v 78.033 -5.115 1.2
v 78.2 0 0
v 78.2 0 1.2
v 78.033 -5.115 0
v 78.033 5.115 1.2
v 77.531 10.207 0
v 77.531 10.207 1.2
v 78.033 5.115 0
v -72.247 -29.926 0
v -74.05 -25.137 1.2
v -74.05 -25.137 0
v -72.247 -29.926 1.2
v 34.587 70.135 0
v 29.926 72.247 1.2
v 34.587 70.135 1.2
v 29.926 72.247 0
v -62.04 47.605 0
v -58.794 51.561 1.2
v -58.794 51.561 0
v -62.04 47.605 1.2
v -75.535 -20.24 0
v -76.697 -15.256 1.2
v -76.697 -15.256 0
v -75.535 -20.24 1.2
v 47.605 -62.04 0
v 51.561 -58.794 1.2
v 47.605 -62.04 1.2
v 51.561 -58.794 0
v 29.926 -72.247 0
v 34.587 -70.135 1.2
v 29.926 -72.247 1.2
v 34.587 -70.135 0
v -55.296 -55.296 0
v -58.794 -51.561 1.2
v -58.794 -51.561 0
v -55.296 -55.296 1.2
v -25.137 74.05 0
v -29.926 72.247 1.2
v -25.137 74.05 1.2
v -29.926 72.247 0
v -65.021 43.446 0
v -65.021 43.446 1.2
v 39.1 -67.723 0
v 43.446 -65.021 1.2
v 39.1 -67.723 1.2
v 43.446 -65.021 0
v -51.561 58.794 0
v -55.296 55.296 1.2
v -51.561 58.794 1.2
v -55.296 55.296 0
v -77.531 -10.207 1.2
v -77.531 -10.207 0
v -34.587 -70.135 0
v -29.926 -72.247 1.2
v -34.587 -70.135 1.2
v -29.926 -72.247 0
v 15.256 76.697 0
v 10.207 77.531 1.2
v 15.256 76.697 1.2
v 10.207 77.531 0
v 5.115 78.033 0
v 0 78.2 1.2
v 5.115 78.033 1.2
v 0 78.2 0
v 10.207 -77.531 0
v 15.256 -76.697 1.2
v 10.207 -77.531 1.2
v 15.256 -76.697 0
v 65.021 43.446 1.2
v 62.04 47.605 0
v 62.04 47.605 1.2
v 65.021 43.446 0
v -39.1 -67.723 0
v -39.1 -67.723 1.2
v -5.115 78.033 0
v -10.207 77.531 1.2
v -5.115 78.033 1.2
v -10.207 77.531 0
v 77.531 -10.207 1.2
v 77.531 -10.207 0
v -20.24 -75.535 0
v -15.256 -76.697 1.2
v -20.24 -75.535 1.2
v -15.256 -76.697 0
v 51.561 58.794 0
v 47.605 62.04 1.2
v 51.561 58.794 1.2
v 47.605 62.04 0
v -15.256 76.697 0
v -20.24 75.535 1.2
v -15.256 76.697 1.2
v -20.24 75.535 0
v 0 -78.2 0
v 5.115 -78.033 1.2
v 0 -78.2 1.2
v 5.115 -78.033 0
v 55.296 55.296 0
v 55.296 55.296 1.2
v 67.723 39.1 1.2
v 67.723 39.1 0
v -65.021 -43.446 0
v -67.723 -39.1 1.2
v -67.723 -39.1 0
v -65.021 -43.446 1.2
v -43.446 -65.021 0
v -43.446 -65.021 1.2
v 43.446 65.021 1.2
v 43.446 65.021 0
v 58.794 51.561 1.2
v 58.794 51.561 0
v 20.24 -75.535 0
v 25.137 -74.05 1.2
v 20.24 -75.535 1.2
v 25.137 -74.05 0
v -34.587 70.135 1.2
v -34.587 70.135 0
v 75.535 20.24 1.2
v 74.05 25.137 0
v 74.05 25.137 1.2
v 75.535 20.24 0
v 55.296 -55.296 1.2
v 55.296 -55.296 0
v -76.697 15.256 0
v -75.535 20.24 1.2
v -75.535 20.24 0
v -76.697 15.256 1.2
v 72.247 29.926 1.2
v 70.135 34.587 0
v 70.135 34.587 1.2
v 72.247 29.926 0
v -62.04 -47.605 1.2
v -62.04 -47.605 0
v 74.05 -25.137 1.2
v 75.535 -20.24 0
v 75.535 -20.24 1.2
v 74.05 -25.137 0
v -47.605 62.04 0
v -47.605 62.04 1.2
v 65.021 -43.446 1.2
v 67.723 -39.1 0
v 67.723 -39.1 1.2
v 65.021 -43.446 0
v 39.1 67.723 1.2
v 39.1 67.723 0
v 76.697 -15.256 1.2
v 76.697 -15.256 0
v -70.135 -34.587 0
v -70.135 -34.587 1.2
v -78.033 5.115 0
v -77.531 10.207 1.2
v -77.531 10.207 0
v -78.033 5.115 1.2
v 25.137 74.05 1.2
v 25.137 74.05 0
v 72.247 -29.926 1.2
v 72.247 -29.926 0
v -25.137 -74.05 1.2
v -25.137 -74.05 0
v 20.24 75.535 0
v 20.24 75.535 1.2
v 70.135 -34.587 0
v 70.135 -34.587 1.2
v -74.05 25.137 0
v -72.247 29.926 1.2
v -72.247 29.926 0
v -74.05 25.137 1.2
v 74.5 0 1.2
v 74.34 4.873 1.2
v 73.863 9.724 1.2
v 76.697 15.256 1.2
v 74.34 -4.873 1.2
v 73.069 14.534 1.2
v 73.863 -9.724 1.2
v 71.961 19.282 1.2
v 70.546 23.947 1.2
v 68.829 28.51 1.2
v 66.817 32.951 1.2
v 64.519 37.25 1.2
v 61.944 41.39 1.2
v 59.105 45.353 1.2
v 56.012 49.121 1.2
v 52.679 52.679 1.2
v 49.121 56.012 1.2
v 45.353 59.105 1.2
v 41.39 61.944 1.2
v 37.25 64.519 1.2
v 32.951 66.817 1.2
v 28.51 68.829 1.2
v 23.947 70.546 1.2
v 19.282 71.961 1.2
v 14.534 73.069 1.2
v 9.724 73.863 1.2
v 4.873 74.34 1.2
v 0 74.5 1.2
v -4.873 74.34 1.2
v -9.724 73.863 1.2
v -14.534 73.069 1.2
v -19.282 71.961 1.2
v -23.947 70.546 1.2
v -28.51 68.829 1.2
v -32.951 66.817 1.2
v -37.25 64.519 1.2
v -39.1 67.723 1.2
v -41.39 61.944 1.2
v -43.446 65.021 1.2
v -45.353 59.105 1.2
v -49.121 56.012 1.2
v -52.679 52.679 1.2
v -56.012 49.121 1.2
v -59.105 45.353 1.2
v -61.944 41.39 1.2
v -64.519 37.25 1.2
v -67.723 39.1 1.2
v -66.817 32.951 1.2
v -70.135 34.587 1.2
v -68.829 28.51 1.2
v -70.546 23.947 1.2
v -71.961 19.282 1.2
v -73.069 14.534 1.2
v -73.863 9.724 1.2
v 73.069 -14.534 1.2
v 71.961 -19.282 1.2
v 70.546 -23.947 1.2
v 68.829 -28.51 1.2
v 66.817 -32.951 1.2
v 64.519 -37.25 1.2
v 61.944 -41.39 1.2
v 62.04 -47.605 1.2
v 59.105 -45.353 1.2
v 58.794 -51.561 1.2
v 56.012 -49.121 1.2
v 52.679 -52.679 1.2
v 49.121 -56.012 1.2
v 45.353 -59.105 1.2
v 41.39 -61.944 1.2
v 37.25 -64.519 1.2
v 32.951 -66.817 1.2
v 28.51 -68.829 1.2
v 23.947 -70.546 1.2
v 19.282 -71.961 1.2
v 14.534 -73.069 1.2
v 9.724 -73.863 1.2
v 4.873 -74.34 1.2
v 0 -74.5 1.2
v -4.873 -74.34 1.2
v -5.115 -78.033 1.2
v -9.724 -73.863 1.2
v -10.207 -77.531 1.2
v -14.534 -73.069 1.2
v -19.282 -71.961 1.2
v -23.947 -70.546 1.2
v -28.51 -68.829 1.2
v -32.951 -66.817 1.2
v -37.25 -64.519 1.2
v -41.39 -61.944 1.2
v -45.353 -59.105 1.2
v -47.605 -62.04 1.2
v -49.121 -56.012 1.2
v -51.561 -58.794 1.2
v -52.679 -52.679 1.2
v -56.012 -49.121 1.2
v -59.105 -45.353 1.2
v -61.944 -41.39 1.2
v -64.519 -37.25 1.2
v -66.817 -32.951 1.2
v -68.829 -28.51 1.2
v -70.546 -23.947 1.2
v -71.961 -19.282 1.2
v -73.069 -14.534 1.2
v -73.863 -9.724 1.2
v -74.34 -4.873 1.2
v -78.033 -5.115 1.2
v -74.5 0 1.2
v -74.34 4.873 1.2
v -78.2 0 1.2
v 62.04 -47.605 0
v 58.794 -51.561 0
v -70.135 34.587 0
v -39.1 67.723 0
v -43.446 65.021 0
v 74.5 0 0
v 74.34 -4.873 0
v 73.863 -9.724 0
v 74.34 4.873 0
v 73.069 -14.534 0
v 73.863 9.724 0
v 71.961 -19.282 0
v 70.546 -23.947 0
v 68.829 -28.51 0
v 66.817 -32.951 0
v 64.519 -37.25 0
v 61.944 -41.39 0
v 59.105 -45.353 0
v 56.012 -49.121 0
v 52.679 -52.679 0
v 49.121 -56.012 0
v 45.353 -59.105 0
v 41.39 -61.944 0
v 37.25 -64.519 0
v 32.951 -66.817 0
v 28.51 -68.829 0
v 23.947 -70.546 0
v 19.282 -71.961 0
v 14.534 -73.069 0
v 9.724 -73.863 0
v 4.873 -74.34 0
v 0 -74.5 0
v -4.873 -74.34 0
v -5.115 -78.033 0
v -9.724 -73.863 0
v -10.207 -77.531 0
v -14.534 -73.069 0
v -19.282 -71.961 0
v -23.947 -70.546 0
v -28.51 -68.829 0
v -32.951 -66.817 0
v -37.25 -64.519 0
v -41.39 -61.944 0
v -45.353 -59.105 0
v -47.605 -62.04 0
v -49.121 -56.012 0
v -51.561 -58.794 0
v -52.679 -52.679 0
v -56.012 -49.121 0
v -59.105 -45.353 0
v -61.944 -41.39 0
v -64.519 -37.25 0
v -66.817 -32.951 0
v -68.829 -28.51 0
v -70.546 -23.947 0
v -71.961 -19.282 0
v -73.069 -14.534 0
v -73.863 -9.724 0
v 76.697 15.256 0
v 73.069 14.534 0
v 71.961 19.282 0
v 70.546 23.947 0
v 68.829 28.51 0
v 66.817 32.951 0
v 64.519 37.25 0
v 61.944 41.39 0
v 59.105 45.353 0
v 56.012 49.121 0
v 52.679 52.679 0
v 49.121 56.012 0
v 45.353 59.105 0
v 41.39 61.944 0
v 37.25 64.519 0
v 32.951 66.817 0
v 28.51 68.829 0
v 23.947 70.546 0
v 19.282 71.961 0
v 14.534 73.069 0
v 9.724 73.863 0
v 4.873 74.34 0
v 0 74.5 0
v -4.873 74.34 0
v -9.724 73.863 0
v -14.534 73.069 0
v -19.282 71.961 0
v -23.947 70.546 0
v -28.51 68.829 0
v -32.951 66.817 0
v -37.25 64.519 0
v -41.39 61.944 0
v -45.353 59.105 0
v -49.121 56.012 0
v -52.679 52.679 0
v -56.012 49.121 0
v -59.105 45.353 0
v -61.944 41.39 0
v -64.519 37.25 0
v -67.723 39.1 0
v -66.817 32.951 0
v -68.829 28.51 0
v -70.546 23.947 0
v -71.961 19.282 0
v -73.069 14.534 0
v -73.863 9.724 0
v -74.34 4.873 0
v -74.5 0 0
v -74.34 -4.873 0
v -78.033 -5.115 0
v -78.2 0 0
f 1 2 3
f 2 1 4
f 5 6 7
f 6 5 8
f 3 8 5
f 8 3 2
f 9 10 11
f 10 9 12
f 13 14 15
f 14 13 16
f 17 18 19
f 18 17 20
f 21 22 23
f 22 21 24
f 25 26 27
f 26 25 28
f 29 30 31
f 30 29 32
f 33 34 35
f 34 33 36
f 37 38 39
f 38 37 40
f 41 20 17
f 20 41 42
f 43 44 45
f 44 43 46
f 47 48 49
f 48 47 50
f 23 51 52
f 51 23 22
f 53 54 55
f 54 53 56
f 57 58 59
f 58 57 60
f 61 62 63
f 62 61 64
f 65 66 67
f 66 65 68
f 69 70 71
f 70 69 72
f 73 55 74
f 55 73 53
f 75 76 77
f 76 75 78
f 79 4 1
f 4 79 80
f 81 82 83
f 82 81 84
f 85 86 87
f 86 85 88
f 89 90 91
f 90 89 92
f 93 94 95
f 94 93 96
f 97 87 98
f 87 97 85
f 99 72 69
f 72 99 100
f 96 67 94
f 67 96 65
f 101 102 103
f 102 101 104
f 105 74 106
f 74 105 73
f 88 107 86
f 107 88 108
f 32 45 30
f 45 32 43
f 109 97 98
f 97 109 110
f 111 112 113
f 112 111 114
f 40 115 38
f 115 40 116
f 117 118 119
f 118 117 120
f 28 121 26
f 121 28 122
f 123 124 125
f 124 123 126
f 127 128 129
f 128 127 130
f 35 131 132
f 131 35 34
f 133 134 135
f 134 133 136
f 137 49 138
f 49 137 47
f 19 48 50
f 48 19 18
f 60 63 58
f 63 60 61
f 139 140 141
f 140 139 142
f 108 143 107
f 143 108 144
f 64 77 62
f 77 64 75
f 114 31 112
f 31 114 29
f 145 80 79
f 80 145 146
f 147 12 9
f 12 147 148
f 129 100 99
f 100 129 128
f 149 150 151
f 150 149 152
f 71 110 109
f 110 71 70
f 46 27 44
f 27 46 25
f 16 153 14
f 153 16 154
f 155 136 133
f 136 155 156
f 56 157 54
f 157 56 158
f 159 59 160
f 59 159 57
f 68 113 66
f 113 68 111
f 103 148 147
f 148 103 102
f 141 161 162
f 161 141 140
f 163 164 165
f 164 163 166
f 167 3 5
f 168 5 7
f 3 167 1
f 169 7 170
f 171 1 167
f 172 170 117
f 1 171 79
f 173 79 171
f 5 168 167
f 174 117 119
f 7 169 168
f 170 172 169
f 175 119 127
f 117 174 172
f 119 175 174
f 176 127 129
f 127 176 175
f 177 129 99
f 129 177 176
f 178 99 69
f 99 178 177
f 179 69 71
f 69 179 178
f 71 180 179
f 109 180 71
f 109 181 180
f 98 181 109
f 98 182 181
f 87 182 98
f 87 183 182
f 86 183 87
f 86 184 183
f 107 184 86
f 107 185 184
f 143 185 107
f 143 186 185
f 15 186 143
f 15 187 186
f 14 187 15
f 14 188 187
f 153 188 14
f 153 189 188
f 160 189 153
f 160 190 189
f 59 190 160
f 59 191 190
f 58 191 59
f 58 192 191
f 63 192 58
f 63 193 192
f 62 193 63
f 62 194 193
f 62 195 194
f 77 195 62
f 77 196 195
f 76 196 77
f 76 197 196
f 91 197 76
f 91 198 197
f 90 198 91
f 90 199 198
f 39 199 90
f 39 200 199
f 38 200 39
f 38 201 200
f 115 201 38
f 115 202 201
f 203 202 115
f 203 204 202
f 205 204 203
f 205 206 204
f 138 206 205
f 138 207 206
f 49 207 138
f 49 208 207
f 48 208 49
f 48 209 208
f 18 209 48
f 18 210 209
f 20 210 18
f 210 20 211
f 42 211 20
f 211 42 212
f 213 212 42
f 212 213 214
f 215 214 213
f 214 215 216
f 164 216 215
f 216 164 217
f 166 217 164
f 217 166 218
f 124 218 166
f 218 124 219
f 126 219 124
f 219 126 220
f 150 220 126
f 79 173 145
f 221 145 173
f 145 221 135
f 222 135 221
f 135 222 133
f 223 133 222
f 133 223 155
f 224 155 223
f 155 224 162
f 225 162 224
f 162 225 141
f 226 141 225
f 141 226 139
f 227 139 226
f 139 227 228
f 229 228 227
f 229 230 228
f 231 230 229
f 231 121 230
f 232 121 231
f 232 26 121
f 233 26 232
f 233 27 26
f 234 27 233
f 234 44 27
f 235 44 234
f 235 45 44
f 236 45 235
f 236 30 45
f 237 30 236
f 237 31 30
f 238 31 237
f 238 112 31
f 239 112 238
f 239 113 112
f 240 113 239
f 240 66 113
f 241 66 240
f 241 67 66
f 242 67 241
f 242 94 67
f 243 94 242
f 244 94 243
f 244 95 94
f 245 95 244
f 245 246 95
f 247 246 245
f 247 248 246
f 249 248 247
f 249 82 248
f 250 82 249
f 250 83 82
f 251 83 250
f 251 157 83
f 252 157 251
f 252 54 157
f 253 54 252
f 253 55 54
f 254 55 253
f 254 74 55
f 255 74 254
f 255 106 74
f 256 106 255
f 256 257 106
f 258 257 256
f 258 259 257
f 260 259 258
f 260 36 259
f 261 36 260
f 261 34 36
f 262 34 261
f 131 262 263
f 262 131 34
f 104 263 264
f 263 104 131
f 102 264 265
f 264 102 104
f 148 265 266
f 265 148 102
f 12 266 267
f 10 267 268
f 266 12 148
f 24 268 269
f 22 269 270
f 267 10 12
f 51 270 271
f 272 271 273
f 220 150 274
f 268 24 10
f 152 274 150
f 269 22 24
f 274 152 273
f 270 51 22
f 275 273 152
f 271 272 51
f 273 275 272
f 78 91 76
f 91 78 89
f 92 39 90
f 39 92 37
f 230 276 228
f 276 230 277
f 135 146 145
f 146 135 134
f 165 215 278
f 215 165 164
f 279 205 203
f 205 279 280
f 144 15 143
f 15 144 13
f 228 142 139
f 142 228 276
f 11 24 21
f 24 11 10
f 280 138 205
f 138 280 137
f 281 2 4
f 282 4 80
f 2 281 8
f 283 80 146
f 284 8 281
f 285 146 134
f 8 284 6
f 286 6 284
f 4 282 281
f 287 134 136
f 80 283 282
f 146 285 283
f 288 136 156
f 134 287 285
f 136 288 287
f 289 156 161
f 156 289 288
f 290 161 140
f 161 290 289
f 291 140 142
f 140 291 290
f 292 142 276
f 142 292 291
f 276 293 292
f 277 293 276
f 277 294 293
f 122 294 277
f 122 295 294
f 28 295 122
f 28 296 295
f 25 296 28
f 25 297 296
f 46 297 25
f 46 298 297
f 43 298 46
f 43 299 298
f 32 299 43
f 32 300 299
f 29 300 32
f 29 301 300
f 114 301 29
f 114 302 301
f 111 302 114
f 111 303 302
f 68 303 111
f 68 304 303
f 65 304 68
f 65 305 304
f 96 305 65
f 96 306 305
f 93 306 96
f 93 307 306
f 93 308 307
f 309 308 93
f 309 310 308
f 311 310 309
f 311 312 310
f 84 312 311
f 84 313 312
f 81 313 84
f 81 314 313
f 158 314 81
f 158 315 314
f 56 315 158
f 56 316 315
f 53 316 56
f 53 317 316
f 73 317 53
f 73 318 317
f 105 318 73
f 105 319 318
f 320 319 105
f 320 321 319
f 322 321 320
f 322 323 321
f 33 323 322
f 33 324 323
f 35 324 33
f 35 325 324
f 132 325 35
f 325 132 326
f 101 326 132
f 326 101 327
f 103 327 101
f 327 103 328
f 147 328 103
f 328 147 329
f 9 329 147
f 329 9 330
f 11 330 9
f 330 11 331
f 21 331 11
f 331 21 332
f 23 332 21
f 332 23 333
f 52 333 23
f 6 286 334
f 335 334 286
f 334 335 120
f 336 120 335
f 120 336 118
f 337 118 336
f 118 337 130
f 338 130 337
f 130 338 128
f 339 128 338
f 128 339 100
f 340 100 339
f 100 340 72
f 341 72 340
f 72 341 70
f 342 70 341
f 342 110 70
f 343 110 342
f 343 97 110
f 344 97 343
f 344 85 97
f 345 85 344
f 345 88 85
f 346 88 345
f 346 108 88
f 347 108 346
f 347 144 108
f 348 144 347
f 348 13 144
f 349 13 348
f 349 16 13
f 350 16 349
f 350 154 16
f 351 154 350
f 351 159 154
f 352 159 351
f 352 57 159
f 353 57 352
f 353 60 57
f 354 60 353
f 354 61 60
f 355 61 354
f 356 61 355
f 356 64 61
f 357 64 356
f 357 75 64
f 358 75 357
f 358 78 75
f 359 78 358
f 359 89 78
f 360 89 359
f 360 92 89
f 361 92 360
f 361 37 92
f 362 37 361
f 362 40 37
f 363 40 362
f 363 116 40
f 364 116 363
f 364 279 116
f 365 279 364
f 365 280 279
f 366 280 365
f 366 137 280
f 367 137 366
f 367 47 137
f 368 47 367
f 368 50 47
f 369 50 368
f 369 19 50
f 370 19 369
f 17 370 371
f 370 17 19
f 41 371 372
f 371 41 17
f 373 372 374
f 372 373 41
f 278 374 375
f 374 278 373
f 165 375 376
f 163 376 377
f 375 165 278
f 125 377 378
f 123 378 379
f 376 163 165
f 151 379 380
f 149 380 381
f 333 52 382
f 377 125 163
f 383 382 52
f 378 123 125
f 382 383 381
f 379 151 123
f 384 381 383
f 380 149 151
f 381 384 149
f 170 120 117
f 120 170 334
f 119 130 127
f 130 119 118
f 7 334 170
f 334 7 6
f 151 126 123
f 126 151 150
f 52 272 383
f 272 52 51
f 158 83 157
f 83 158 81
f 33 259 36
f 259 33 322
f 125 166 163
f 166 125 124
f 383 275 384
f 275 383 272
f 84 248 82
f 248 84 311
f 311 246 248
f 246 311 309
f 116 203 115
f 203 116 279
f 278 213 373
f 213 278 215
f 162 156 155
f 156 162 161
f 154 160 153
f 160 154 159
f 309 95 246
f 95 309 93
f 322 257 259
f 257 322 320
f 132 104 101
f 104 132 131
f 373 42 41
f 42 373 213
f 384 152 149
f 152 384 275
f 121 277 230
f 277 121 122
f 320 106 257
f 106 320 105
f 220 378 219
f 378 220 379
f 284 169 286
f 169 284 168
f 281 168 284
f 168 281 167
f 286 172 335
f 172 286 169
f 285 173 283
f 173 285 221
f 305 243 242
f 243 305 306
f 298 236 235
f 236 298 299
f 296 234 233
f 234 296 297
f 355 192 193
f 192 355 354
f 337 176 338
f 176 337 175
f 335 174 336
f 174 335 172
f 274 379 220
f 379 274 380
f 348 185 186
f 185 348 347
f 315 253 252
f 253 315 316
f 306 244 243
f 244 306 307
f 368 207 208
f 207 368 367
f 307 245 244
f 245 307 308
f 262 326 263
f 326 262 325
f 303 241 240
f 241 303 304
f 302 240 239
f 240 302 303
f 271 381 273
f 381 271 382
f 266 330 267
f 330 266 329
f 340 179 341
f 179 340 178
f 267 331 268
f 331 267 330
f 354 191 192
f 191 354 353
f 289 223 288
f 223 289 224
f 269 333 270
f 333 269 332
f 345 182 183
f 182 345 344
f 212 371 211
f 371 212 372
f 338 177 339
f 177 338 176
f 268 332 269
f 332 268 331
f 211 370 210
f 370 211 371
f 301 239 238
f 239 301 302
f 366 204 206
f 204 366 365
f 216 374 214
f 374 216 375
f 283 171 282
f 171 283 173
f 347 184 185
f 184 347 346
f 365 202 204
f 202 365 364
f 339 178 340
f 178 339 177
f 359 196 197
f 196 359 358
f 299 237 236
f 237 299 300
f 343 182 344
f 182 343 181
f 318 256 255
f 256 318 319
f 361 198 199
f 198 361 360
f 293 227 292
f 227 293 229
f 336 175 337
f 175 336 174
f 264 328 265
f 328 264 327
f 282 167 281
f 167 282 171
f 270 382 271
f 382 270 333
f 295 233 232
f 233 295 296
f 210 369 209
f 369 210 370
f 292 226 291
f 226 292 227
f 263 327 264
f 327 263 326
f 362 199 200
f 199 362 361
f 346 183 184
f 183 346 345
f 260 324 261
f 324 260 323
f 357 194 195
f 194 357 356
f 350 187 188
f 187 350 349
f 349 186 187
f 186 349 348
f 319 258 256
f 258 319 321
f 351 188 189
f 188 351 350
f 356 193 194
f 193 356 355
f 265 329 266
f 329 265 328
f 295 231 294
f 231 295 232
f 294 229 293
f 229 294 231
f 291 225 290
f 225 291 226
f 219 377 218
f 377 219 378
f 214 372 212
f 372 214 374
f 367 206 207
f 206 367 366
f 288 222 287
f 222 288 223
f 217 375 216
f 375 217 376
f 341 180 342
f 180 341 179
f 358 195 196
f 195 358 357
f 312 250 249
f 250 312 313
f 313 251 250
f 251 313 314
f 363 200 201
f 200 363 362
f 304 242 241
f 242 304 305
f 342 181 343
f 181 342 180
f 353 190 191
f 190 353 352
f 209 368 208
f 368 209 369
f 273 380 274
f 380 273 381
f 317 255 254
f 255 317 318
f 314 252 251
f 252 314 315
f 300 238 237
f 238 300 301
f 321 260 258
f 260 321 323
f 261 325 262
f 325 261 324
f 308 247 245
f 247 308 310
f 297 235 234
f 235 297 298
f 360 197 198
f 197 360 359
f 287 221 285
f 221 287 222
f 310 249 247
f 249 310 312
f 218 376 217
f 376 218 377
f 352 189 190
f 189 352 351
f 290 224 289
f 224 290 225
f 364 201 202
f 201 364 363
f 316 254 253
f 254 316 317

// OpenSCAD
// file: params.scad
// ==========================================
// Coffee Cooler Parameters / コーヒークーラー共通パラメータ
// ==========================================

// --- Global Settings / 全体設定 ---
$fn = 96;           // Rendering resolution / 円や曲面の分割数
wall = 3;           // Standard wall thickness / 標準の壁厚
clearance = 0.4;    // General mechanical clearance / 嵌合や穴用の基本クリアランス

// --- Main Body Sections / 本体の主要寸法 ---
body_outer_d = 165;  // Outer diameter of the main cylindrical body / 本体円筒部の外径
top_ring_h = 20;     // Height of the top ring that holds the sieve / ザル受け上部リングの高さ
plenum_h = 45;       // Height of the air plenum section / ザル下の整流空間の高さ
base_h = 80;         // Height of the base section (housing the fan) / ファンを収めるベース部の高さ

// --- Sieve & Gasket (Top Section) / ザルとガスケット ---
// Parameters for the coffee sieve/filter / コーヒー用うらごしザルの寸法
sieve_ring_outer_d = 156;                 // ザル付属金属リングの外径
sieve_outer_d = sieve_ring_outer_d;       // mock表示用のザル外径。実寸基準はsieve_ring_outer_d
sieve_h = 55;                             // ザル全体の高さ
sieve_ring_seat_d = sieve_ring_outer_d + 0.8;  // top_ring側のザル受けポケット径
sieve_ring_seat_depth = 10;               // ザル受けポケットの深さ
sieve_opening_d = 148;                    // top_ring中央の吸気開口径
sieve_loop_relief_w = 30;                 // 未使用: ザル横リング逃げの幅
sieve_loop_relief_d = 7;                  // 未使用: ザル横リング逃げの奥行き
sieve_loop_relief_h = 12;                 // 未使用: ザル横リング逃げの高さ
sieve_seat_d = sieve_ring_seat_d;         // 互換用: ザル受け径
sieve_lip_h = sieve_ring_seat_depth;      // 互換用: ザル受けリップ高さ

// Gasket parameters (intended for TPU printing) / TPUガスケット寸法
gasket_outer_d = sieve_ring_seat_d - 0.4;  // TPUガスケットの外径
gasket_inner_d = sieve_opening_d + 1.0;    // TPUガスケットの内径
gasket_h = 1.2;                            // TPUガスケットの厚み
gasket_loop_relief_w = sieve_loop_relief_w + 2;  // 未使用: 旧切り欠き用の幅
gasket_loop_relief_d = sieve_loop_relief_d + 1;  // 未使用: 旧切り欠き用の奥行き

// --- Fan & Mount / 120mmファンと固定部 ---
// Standard 120mm fan parameters / 一般的な120mm PCファン寸法
fan_size = 120;              // ファン外形サイズ
fan_clearance = 1.0;         // ファン外形まわりの逃げ
fan_cutout_d = 113;          // ファン開口径
fan_hole_pitch = 105;        // ファン固定穴ピッチ
fan_screw_d = 4.5;           // ファン固定ネジの通し穴径
fan_thickness = 25;          // ファン厚み
fan_plate_thickness = 4;     // ファン取付プレートの厚み
fan_seal_lip_h = 2;          // ファン開口まわりのシールリップ高さ
fan_seal_lip_w = 7;          // ファン開口まわりのシールリップ幅

// --- Ventilation Slots / 側面排気スリット ---
// Air exhaust slots on the base / ベース側面の排気口寸法
vent_slot_w = 34;       // 排気スリットの横幅
vent_slot_h = 9;        // 排気スリットの高さ
vent_row_pitch = vent_slot_h + 6;  // 排気スリットの段間ピッチ
vent_rows = 4;          // 排気スリットの段数
vent_count = 8;         // 円周方向の排気スリット数
vent_center_z = base_h / 2;  // 排気スリット群の中心高さ

// --- Electronics Bay / 電装室 ---
// Internal space for PWM controller and DC barrel jack. / PWMコントローラとDC電源ジャックの収納部
electronics_box_d = 32;  // 電装室の奥行き
electronics_box_w = 80;  // 電装室の幅
electronics_box_h = 45;  // 電装室の高さ
// main file
include <params.scad>

module gasket() {
    difference() {
        cylinder(h = gasket_h, d = gasket_outer_d);

        translate([0, 0, -0.1])
            cylinder(h = gasket_h + 0.2, d = gasket_inner_d);

    }
}

gasket();
